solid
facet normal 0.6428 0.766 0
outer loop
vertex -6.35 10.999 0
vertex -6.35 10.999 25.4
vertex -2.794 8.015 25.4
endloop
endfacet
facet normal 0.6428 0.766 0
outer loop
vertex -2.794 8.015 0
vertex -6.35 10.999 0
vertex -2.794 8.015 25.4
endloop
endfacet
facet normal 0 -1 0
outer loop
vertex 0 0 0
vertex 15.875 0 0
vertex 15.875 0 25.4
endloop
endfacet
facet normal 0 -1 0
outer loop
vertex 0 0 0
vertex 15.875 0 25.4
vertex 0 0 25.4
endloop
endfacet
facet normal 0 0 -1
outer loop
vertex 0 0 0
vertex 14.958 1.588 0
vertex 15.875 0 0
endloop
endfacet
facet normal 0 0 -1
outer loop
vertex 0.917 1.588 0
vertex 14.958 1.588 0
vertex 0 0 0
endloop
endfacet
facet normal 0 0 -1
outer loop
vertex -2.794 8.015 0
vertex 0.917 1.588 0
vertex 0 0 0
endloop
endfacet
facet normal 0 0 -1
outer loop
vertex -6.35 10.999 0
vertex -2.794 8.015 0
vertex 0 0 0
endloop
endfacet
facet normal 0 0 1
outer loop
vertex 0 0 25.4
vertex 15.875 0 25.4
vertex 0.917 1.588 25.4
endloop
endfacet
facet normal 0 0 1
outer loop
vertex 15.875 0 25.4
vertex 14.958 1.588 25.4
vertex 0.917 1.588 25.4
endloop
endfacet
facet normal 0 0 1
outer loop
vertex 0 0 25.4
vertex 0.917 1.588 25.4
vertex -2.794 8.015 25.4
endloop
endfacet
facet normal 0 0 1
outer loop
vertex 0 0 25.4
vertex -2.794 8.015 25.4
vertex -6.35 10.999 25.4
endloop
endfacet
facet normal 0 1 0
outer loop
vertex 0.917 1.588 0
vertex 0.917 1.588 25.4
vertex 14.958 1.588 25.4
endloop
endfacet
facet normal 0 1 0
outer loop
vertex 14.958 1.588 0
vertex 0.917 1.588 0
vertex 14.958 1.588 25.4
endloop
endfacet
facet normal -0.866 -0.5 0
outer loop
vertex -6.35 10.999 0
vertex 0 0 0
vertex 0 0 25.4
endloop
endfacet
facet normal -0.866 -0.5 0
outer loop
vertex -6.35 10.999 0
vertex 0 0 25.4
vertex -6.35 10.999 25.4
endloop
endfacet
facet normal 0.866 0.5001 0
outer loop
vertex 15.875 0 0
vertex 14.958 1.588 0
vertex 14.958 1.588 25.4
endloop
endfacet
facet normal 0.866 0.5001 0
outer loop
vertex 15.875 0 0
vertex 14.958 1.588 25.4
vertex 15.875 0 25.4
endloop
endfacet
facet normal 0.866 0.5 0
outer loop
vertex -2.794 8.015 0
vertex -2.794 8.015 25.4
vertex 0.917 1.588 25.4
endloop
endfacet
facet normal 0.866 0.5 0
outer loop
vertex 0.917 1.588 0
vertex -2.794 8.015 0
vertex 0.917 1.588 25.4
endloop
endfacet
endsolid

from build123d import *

# Parameters (mm, degrees)
BOSS_EXTRUDE1_DEPTH = 25.4
CUT_EXTRUDE1_DEPTH  = 26.4


with BuildPart() as part:
    # Sketch1 → Boss-Extrude1 (new body)
    with BuildSketch(Plane.XY):
        Polygon((0, 0), (-6.35, 10.998522628), (-4.516912895, 10.998522628), (0.916543552, 1.5875), (14.958456448, 1.5875), (15.875, 0), align=None)
    extrude(amount=BOSS_EXTRUDE1_DEPTH)

    # Sketch2 → Cut-Extrude1 (cut, through all)
    with BuildSketch(Plane.XY.offset(25.4)):
        Polygon((-6.35, 10.998522628), (-2.79437447, 8.014998557), (-4.516912895, 10.998522628), align=None)
    extrude(amount=-CUT_EXTRUDE1_DEPTH, mode=Mode.SUBTRACT)


solid = part.part
